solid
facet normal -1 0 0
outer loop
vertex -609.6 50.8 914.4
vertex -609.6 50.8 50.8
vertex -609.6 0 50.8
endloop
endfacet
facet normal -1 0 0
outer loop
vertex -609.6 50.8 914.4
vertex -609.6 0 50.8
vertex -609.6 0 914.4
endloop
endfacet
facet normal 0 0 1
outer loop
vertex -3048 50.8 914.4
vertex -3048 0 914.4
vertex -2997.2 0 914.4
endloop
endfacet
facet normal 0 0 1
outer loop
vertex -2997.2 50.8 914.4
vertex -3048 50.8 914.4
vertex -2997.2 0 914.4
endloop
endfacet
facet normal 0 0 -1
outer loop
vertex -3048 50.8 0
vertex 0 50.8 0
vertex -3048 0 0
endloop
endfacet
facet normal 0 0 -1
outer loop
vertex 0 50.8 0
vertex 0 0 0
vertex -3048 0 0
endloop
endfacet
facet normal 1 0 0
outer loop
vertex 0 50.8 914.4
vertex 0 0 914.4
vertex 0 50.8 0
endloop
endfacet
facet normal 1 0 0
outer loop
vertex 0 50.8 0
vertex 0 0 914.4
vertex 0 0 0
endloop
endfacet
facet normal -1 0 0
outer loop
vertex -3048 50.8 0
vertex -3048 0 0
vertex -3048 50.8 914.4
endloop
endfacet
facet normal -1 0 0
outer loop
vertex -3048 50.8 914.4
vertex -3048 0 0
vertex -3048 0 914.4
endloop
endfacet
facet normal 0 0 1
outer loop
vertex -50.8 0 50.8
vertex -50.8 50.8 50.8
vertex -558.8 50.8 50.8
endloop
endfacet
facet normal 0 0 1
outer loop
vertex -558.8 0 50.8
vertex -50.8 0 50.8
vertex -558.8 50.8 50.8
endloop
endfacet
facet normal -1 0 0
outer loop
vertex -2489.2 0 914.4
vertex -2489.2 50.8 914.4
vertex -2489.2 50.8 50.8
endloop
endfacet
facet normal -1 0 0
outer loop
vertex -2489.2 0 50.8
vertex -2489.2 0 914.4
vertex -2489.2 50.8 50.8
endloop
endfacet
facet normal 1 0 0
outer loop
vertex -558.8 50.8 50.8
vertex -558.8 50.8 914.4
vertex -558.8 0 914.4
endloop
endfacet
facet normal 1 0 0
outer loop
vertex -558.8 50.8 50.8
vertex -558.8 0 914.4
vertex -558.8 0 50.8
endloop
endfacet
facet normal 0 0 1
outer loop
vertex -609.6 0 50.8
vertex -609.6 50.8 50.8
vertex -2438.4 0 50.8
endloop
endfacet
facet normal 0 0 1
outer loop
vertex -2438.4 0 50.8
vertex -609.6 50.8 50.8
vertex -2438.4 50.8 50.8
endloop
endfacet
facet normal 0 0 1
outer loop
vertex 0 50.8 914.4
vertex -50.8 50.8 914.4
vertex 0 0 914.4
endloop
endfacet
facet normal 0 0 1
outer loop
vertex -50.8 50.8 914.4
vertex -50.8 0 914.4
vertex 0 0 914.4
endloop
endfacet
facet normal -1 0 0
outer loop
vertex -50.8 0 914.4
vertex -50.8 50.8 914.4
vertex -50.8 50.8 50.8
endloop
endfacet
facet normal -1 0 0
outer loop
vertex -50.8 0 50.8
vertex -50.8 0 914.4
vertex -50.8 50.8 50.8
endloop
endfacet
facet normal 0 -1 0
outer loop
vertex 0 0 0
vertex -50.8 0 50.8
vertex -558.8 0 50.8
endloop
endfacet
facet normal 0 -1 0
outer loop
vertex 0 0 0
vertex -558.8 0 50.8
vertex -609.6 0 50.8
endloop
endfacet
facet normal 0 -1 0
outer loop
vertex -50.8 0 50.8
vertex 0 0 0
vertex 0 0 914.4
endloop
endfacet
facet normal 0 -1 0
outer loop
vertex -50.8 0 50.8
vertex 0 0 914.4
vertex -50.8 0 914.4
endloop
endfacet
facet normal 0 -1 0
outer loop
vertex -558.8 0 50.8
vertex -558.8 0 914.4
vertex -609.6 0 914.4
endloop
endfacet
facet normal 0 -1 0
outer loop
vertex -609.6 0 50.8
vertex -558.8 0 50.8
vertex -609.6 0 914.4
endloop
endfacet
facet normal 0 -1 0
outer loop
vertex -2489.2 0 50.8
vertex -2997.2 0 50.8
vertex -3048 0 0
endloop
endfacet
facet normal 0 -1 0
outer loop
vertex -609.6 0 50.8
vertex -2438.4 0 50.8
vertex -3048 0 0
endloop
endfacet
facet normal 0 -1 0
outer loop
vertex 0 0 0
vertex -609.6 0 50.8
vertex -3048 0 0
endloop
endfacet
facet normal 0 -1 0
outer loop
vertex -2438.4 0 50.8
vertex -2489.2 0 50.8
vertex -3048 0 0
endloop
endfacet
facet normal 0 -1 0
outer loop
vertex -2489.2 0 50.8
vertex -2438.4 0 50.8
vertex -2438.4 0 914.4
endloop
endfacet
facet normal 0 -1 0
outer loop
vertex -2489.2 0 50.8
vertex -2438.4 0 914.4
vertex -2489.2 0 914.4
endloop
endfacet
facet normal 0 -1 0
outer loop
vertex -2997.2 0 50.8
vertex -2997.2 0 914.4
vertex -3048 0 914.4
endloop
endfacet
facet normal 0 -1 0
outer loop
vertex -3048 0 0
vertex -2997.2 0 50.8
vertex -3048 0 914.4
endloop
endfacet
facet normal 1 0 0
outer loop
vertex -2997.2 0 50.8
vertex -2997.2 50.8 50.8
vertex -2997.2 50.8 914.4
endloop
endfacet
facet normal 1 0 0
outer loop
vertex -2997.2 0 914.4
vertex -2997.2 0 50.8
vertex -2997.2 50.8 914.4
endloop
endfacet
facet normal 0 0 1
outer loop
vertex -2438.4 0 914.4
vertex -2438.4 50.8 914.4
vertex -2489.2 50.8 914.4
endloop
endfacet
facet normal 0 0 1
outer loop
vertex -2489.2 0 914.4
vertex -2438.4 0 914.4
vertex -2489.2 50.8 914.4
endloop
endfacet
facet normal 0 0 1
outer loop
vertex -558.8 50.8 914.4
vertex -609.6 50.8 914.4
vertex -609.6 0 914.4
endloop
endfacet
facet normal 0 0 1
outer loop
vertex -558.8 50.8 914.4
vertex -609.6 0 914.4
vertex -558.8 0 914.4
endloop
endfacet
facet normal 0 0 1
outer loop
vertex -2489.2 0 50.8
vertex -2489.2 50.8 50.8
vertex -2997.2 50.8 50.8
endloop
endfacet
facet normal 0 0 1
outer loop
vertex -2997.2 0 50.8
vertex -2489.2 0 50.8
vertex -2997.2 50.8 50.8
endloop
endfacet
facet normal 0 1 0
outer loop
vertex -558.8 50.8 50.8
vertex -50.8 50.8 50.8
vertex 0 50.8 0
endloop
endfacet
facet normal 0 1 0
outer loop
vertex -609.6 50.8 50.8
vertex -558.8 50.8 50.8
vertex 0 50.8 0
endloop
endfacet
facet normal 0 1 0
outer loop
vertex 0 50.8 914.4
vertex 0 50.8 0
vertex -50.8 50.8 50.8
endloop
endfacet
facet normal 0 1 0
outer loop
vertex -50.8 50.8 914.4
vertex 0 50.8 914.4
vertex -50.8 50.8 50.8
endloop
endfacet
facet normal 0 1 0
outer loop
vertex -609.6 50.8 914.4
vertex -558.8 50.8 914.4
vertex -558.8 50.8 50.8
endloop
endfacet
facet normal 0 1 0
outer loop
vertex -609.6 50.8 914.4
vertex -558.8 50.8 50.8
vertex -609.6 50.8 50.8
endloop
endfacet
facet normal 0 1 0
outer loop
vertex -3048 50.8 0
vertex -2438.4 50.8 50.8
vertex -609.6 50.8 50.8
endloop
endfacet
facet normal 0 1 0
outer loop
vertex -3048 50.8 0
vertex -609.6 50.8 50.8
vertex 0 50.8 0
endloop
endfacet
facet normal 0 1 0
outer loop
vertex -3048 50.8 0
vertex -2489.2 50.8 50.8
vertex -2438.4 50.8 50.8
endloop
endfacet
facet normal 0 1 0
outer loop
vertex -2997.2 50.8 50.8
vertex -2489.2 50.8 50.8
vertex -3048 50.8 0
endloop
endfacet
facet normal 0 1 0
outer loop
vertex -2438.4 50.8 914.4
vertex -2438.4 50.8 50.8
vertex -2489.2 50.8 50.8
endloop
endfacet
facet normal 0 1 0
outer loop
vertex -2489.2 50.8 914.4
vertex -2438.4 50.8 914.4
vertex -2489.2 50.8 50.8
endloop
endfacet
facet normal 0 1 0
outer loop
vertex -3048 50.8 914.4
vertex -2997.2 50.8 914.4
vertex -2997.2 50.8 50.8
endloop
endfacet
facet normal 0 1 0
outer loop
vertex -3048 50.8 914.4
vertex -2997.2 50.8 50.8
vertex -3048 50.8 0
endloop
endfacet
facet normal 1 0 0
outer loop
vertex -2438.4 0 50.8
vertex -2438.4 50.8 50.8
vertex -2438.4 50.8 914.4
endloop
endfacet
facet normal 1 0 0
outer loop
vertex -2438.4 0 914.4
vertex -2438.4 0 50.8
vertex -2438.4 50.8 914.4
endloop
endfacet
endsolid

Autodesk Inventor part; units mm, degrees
ref_plane "YZ Plane" through (0, 0, 0) normal (1, 0, 0) x (0, 1, 0)
ref_plane "XZ Plane" through (0, 0, 0) normal (0, 1, 0) x (-1, 0, 0)
ref_plane "XY Plane" through (0, 0, 0) normal (0, 0, 1) x (1, 0, 0)
sketch "Sketch1" plane through (0, 0, 0) normal (0, 1, 0) x (-1, 0, 0)
  line L0 (0, 0) -> (3048, 0)
  line L1 (3048, 0) -> (3048, 914.4)
  line L2 (3048, 914.4) -> (0, 914.4)
  line L3 (0, 914.4) -> (0, 0)
  dimension "d0" = 3048
  dimension "d1" = 914.4
extrude "Extrusion1" add sketch "Sketch1" along normal blind 50.8
sketch "Sketch2" plane through (0, 50.8, 0) normal (0, 1, 0) x (1, 0, 0)
  line L0 (-3048, -914.4) -> (0, -914.4) projected
  line L1 (-2997.2, -914.4) -> (-50.8, -914.4)
  line L2 (-50.8, -914.4) -> (-50.8, -50.8)
  line L3 (-50.8, -50.8) -> (-2997.2, -50.8)
  line L4 (-2997.2, -50.8) -> (-2997.2, -914.4)
  dimension "d4" = 2946.4
  dimension "d5" = 863.6
extrude "Extrusion2" cut sketch "Sketch2" against normal blind 442.9125
sketch "Sketch3" plane through (0, 50.8, 0) normal (0, 1, 0) x (1, 0, 0)
  line L0 (-50.8, -50.8) -> (-50.8, -914.4) projected
  line L1 (-2997.2, -914.4) -> (-2997.2, -50.8) projected
  line L2 (-2997.2, -50.8) -> (-50.8, -50.8) projected
  line L3 (-558.8, -50.8) -> (-609.6, -50.8)
  line L4 (-609.6, -50.8) -> (-609.6, -914.4)
  line L5 (-609.6, -914.4) -> (-558.8, -914.4)
  line L6 (-558.8, -914.4) -> (-558.8, -50.8)
  line L7 (-2489.2, -50.8) -> (-2438.4, -50.8)
  line L8 (-2438.4, -50.8) -> (-2438.4, -914.4)
  line L9 (-2438.4, -914.4) -> (-2489.2, -914.4)
  line L10 (-2489.2, -914.4) -> (-2489.2, -50.8)
  dimension "d8" = 50.8
  dimension "d9" = 50.8
  dimension "d10" = 508
  dimension "d11" = 508
extrude "Extrusion3" add sketch "Sketch3" against normal blind 50.8
properties part number "banner holder"
